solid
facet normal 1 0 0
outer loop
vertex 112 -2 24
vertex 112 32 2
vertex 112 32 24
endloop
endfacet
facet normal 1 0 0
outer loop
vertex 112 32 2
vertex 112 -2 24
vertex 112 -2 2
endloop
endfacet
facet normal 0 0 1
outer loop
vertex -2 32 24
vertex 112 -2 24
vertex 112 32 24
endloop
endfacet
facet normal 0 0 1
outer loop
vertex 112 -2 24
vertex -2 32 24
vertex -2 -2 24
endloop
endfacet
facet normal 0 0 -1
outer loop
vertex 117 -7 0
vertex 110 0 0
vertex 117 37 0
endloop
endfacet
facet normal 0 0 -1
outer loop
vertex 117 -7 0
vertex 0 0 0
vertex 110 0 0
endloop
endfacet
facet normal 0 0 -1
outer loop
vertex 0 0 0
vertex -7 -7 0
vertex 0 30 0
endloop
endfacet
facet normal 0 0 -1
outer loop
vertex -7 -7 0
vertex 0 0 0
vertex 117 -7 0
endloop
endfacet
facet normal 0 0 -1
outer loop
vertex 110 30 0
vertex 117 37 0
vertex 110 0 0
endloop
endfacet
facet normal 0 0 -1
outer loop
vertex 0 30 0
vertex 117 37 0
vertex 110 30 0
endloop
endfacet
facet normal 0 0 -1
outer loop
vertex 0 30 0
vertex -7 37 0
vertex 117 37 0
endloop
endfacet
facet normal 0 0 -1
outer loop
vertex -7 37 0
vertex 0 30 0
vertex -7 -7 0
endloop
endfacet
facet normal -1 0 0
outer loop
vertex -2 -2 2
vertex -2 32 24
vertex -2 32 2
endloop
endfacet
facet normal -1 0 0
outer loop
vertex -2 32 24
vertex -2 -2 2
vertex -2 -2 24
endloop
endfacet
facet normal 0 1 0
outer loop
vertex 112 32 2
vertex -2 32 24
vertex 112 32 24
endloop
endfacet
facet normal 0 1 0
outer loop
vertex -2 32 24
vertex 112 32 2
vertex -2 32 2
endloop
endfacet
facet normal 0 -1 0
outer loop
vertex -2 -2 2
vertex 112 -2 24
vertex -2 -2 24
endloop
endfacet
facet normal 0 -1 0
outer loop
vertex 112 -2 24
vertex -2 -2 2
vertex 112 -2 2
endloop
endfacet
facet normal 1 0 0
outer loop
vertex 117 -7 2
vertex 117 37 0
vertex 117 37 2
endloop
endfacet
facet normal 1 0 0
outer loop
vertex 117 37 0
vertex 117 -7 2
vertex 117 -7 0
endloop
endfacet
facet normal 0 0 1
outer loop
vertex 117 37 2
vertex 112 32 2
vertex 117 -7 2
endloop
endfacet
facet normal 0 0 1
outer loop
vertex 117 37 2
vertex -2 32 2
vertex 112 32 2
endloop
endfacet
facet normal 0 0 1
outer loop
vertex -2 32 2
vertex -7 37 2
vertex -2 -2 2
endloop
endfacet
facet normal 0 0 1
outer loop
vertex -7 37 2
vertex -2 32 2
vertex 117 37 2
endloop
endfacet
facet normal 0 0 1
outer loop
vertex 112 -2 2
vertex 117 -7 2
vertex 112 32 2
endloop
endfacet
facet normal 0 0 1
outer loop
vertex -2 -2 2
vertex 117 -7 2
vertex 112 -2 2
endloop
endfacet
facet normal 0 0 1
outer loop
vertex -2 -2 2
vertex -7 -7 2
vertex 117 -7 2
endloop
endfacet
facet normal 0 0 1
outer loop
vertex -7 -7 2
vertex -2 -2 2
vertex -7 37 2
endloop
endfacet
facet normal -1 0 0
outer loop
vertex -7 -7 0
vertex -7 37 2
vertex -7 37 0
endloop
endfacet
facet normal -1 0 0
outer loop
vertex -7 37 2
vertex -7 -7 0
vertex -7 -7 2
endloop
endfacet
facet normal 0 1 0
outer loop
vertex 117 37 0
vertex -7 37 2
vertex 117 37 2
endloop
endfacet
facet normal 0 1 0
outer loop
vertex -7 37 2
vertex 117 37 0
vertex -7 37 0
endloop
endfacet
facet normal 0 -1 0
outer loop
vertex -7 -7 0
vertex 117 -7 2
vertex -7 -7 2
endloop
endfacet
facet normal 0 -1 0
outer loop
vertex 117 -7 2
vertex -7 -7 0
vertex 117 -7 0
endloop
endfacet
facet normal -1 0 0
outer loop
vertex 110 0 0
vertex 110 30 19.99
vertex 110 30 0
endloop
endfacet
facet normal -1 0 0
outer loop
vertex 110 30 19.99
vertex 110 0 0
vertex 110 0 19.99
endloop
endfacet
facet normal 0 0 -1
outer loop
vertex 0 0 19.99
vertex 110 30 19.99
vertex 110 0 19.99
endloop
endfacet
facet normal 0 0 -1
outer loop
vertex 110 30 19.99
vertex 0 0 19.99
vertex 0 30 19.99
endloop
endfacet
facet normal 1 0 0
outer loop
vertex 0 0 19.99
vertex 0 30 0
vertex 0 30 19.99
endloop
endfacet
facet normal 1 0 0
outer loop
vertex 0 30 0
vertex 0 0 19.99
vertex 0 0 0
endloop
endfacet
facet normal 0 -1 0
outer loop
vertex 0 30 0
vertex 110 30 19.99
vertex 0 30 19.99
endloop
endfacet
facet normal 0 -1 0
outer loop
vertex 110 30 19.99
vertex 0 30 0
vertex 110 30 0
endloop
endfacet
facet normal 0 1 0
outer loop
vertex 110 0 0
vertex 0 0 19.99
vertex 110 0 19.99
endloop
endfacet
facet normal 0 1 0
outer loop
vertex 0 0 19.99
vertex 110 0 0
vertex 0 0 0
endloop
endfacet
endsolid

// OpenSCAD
case_inner_width=110;
case_inner_height=30;
case_inner_depth=20;
case_wall_thickness=2;
case_flange=5;

difference() {
  union() {
    //main case
    translate([-case_wall_thickness, -case_wall_thickness, 0])
      cube([case_inner_width+2*case_wall_thickness, case_inner_height+2*case_wall_thickness, case_inner_depth+2*case_wall_thickness]);
    translate([-case_wall_thickness-case_flange, -case_wall_thickness-case_flange, 0])
      cube([case_inner_width+2*case_wall_thickness+2*case_flange, case_inner_height+2*case_wall_thickness+2*case_flange, case_wall_thickness]);
  }
  //inner difference blocker
  translate([0, 0, -0.01])
    cube([case_inner_width, case_inner_height, case_inner_depth]);
}
